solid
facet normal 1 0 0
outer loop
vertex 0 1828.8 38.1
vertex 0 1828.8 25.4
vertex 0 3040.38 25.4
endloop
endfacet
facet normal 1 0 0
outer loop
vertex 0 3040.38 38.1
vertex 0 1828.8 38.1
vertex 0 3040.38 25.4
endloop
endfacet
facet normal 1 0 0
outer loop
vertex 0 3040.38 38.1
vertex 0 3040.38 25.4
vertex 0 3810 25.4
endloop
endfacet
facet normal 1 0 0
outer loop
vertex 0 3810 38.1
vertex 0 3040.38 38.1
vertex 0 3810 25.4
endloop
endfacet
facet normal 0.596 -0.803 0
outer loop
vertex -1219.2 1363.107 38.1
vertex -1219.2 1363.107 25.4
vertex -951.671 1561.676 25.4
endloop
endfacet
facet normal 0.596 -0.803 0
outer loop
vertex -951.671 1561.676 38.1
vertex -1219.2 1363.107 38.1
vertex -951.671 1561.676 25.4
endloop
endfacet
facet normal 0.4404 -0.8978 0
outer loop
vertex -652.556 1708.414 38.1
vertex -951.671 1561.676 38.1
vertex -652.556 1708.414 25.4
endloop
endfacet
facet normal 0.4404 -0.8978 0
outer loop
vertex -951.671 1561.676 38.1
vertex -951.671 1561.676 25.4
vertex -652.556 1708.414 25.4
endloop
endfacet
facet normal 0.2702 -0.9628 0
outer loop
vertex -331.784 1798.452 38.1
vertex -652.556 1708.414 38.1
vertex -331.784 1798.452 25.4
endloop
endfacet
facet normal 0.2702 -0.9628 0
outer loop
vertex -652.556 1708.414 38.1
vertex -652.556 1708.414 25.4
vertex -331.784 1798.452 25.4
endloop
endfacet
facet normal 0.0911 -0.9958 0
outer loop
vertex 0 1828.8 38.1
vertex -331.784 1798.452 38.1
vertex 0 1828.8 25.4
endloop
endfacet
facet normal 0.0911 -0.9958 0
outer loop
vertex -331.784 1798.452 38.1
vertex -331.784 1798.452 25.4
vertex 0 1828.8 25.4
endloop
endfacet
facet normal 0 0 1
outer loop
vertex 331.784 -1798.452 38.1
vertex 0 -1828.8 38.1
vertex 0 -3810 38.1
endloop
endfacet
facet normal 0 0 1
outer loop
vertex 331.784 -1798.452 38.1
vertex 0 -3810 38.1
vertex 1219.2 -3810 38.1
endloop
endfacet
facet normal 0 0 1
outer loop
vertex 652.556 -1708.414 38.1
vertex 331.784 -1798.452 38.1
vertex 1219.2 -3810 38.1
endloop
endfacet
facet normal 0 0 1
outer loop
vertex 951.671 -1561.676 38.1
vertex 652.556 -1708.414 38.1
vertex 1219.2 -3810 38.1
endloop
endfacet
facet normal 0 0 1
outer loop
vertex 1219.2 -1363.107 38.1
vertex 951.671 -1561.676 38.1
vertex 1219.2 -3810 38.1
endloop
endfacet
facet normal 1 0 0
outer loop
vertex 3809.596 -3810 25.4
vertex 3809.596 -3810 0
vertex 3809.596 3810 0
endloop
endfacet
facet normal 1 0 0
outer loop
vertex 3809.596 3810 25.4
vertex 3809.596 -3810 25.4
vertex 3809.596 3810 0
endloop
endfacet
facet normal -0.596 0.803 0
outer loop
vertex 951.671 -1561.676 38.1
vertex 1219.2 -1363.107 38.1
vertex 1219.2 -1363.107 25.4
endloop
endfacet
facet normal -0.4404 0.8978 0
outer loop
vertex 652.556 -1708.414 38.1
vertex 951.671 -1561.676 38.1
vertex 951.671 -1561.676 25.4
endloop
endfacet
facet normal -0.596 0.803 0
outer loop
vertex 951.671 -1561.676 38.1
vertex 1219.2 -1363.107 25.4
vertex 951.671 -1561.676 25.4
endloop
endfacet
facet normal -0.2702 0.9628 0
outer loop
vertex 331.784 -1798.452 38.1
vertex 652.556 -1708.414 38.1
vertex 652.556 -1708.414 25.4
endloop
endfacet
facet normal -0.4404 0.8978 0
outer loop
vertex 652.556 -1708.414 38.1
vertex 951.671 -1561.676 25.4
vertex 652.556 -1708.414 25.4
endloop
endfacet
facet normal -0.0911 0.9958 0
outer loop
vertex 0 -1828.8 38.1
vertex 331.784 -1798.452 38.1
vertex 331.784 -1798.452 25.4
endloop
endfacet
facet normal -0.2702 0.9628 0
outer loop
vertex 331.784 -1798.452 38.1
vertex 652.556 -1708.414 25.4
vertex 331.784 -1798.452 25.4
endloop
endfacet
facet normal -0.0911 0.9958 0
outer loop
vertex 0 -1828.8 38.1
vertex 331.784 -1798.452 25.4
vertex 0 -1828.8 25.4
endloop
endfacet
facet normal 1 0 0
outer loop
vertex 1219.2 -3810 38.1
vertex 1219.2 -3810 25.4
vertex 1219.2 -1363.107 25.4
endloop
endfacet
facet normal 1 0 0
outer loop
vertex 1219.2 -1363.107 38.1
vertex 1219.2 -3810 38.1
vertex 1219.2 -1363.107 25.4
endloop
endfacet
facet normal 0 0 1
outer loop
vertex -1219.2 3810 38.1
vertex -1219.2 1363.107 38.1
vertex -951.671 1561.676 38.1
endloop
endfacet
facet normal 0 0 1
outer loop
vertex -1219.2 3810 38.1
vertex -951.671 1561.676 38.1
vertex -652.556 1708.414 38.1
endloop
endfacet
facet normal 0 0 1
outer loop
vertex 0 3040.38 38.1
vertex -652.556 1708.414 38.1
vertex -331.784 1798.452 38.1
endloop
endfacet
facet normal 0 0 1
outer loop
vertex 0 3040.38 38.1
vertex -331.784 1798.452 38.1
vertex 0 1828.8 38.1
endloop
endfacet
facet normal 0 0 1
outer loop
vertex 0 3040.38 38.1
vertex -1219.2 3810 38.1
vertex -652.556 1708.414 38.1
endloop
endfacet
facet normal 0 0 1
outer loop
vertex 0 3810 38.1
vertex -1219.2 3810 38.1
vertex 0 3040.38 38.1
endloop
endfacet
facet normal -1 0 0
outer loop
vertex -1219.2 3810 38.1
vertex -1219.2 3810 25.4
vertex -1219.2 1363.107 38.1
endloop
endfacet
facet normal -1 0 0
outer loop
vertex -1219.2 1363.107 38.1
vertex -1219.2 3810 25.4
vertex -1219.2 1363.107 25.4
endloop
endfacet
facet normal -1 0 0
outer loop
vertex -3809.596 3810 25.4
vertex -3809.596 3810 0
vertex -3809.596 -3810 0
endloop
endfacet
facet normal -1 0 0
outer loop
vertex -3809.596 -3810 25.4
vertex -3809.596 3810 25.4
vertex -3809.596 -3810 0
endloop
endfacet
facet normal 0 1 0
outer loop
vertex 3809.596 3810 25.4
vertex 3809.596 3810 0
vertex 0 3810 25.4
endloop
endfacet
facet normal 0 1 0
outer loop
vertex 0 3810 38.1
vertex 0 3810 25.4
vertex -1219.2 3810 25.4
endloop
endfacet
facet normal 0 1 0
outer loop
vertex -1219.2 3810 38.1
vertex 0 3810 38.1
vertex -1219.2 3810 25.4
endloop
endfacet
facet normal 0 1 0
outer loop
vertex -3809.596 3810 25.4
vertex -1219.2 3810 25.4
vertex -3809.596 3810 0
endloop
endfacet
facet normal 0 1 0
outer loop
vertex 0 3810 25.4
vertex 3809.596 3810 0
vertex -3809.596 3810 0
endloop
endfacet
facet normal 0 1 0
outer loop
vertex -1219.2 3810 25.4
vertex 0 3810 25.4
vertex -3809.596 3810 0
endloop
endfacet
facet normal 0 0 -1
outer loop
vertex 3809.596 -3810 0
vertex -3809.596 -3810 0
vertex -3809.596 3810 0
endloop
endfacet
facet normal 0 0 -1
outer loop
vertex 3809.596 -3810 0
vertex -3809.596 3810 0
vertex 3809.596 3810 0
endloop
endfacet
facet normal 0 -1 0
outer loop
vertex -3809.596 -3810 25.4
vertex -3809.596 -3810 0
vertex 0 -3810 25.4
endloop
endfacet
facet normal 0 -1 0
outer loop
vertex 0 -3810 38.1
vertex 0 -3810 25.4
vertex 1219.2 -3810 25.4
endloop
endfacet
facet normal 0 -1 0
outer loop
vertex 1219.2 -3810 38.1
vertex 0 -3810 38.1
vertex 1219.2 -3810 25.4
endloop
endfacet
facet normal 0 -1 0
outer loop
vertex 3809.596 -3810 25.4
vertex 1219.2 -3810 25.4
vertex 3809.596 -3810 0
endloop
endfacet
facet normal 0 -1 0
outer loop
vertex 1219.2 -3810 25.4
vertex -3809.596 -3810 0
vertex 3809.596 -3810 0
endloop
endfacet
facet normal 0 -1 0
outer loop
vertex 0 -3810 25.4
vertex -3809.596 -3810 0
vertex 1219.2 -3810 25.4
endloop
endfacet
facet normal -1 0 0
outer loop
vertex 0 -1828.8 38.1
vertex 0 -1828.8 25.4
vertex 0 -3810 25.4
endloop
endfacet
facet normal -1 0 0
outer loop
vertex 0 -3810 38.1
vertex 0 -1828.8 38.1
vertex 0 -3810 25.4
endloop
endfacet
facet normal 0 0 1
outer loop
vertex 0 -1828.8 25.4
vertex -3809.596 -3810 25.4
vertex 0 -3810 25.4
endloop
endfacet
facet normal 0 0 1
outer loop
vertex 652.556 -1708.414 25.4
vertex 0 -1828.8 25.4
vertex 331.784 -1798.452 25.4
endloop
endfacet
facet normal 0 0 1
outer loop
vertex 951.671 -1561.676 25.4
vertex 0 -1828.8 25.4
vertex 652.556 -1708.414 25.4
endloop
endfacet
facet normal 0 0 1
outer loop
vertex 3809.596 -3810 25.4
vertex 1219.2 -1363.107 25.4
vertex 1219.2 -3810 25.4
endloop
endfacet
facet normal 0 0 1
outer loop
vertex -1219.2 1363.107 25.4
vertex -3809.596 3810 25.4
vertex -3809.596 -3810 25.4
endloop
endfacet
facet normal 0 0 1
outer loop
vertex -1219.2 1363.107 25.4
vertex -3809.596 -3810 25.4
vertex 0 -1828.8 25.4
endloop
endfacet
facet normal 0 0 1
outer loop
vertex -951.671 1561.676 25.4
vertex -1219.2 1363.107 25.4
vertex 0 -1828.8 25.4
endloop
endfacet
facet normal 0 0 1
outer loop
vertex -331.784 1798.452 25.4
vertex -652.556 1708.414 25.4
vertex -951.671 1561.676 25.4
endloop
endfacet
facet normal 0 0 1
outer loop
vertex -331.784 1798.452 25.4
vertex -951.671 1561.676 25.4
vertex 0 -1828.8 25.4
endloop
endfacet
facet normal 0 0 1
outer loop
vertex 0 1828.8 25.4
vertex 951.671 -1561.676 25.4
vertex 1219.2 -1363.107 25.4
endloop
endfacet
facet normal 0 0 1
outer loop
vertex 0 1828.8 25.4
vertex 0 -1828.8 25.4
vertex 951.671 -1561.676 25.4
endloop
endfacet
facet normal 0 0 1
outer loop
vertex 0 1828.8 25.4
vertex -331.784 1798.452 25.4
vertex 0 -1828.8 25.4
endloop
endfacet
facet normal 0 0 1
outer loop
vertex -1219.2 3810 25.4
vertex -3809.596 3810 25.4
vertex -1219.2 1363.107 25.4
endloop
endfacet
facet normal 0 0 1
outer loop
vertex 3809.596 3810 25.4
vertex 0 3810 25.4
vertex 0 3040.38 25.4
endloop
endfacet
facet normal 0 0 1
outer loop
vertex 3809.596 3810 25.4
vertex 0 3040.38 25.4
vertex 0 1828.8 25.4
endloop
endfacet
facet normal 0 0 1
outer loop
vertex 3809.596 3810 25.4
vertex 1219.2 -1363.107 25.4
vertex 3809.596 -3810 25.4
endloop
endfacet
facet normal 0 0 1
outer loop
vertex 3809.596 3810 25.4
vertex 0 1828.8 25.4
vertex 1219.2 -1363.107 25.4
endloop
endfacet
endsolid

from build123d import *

# Parameters (mm, degrees)
F0_R     = 1790.7
F1_DEPTH = 25.4
F3_DEPTH = 25.4
F4_DEPTH = 25.4
F5_DEPTH = 38.1


# Not quite as in the source:
# - the program builds the solid bodies; features that only make, move or delete a surface that nothing else refers to are left out


with BuildPart() as f1:
    # F0 (on Top) → F1 (new body)
    with BuildSketch(Plane.XY):
        with BuildLine():
            Line((-1219.2, 3810.0001542995), (-3809.5957711624, 3810.0001542995))
            Line((-3809.5957711624, 3810.0001542995), (-3809.5957711624, -3809.9998457005))
            Line((-3809.5957711624, -3809.9998457005), (3.7253e-06, -3809.9998457005))
            Line((3.7253e-06, -3809.9998457005), (3.0473e-06, -3116.5800094754))
            Line((3.0473e-06, -3116.5800094754), (2.2873e-06, -2339.3399715424))
            Line((2.2873e-06, -2339.3399715424), (1.7881e-06, -1828.8))
            ThreePointArc((1.7881e-06, -1828.8), (-1708.414409752, -652.5562386122), (-1219.2, 1363.1070390839))
            Line((-1219.2, 1363.1070390839), (-1219.2, 2247.9000093898))
            Line((-1219.2, 2247.9000093898), (-1219.2, 3040.3800010681))
            Line((-1219.2, 3040.3800010681), (-1219.2, 3810.0001542995))
        make_face()
        with BuildLine():
            Line((3809.595778613, 3810.0001542995), (3.7253e-06, 3810.0001542995))
            Line((3.7253e-06, 3810.0001542995), (0, 3040.3800010681))
            Line((0, 3040.3800010681), (0, 2247.9000081977))
            Line((0, 2247.9000081977), (0, 1828.8))
            ThreePointArc((0, 1828.8), (1293.156881434, 1293.156881434), (1828.8, 0))
            ThreePointArc((1828.8, 0), (1669.4583559266, -746.6044721449), (1219.2000023767, -1363.1070369581))
            Line((1219.2000023767, -1363.1070369581), (1219.2000023767, -2339.3399703503))
            Line((1219.2000023767, -2339.3399703503), (1219.2000023767, -3116.5800082833))
            Line((1219.2000023767, -3116.5800082833), (1219.2000023767, -3809.9998457005))
            Line((1219.2000023767, -3809.9998457005), (3809.595778613, -3809.9998457005))
            Line((3809.595778613, -3809.9998457005), (3809.595778613, 3810.0001542995))
        make_face()
        with BuildLine():
            ThreePointArc((0, 1828.8), (-652.556237777, 1708.414410071), (-1219.2, 1363.1070390839))
            ThreePointArc((-1219.2, 1363.1070390839), (-1708.414409752, -652.5562386122), (1.7881e-06, -1828.8))
            ThreePointArc((1.7881e-06, -1828.8), (652.5562401017, -1708.4144091831), (1219.2000023767, -1363.1070369581))
            ThreePointArc((1219.2000023767, -1363.1070369581), (1669.4583559266, -746.6044721449), (1828.8, 0))
            ThreePointArc((1828.8, 0), (1293.156881434, 1293.156881434), (0, 1828.8))
        make_face()
        Circle(F0_R, mode=Mode.SUBTRACT)
    extrude(amount=F1_DEPTH)

    # F0 (on Top) → F3 (join)
    with BuildSketch(Plane.XY):
        with BuildLine():
            Line((-1219.2, 3810.0001542995), (-3809.5957711624, 3810.0001542995))
            Line((-3809.5957711624, 3810.0001542995), (-3809.5957711624, -3809.9998457005))
            Line((-3809.5957711624, -3809.9998457005), (3.7253e-06, -3809.9998457005))
            Line((3.7253e-06, -3809.9998457005), (3.0473e-06, -3116.5800094754))
            Line((3.0473e-06, -3116.5800094754), (2.2873e-06, -2339.3399715424))
            Line((2.2873e-06, -2339.3399715424), (1.7881e-06, -1828.8))
            ThreePointArc((1.7881e-06, -1828.8), (-1708.414409752, -652.5562386122), (-1219.2, 1363.1070390839))
            Line((-1219.2, 1363.1070390839), (-1219.2, 2247.9000093898))
            Line((-1219.2, 2247.9000093898), (-1219.2, 3040.3800010681))
            Line((-1219.2, 3040.3800010681), (-1219.2, 3810.0001542995))
        make_face()
        Polygon((3.7253e-06, 3810.0001542995), (-1219.2, 3810.0001542995), (-1219.2, 3040.3800010681), (0, 3040.3800010681), align=None)
        with BuildLine():
            Line((3809.595778613, 3810.0001542995), (3.7253e-06, 3810.0001542995))
            Line((3.7253e-06, 3810.0001542995), (0, 3040.3800010681))
            Line((0, 3040.3800010681), (0, 2247.9000081977))
            Line((0, 2247.9000081977), (0, 1828.8))
            ThreePointArc((0, 1828.8), (1293.156881434, 1293.156881434), (1828.8, 0))
            ThreePointArc((1828.8, 0), (1669.4583559266, -746.6044721449), (1219.2000023767, -1363.1070369581))
            Line((1219.2000023767, -1363.1070369581), (1219.2000023767, -2339.3399703503))
            Line((1219.2000023767, -2339.3399703503), (1219.2000023767, -3116.5800082833))
            Line((1219.2000023767, -3116.5800082833), (1219.2000023767, -3809.9998457005))
            Line((1219.2000023767, -3809.9998457005), (3809.595778613, -3809.9998457005))
            Line((3809.595778613, -3809.9998457005), (3809.595778613, 3810.0001542995))
        make_face()
        Polygon((3.0473e-06, -3116.5800094754), (3.7253e-06, -3809.9998457005), (1219.2000023767, -3809.9998457005), (1219.2000023767, -3116.5800082833), align=None)
    extrude(amount=F3_DEPTH)

    # F0 (on Top) → F4 (join)
    with BuildSketch(Plane.XY):
        Circle(F0_R)
    extrude(amount=F4_DEPTH)

    # F0 (on Top) → F5 (join)
    with BuildSketch(Plane.XY):
        Polygon((3.7253e-06, 3810.0001542995), (-1219.2, 3810.0001542995), (-1219.2, 3040.3800010681), (0, 3040.3800010681), align=None)
        with BuildLine():
            Line((0, 2247.9000081977), (-1219.2, 2247.9000093898))
            Line((-1219.2, 2247.9000093898), (-1219.2, 1363.1070390839))
            ThreePointArc((-1219.2, 1363.1070390839), (-652.556237777, 1708.414410071), (0, 1828.8))
            Line((0, 1828.8), (0, 2247.9000081977))
        make_face()
        Polygon((0, 3040.3800010681), (-1219.2, 3040.3800010681), (-1219.2, 2247.9000093898), (0, 2247.9000081977), align=None)
        with BuildLine():
            Line((1.7881e-06, -1828.8), (2.2873e-06, -2339.3399715424))
            Line((2.2873e-06, -2339.3399715424), (1219.2000023767, -2339.3399703503))
            Line((1219.2000023767, -2339.3399703503), (1219.2000023767, -1363.1070369581))
            ThreePointArc((1219.2000023767, -1363.1070369581), (652.5562401017, -1708.4144091831), (1.7881e-06, -1828.8))
        make_face()
        Polygon((2.2873e-06, -2339.3399715424), (3.0473e-06, -3116.5800094754), (1219.2000023767, -3116.5800082833), (1219.2000023767, -2339.3399703503), align=None)
        Polygon((3.0473e-06, -3116.5800094754), (3.7253e-06, -3809.9998457005), (1219.2000023767, -3809.9998457005), (1219.2000023767, -3116.5800082833), align=None)
    extrude(amount=F5_DEPTH)


solid = f1.part
